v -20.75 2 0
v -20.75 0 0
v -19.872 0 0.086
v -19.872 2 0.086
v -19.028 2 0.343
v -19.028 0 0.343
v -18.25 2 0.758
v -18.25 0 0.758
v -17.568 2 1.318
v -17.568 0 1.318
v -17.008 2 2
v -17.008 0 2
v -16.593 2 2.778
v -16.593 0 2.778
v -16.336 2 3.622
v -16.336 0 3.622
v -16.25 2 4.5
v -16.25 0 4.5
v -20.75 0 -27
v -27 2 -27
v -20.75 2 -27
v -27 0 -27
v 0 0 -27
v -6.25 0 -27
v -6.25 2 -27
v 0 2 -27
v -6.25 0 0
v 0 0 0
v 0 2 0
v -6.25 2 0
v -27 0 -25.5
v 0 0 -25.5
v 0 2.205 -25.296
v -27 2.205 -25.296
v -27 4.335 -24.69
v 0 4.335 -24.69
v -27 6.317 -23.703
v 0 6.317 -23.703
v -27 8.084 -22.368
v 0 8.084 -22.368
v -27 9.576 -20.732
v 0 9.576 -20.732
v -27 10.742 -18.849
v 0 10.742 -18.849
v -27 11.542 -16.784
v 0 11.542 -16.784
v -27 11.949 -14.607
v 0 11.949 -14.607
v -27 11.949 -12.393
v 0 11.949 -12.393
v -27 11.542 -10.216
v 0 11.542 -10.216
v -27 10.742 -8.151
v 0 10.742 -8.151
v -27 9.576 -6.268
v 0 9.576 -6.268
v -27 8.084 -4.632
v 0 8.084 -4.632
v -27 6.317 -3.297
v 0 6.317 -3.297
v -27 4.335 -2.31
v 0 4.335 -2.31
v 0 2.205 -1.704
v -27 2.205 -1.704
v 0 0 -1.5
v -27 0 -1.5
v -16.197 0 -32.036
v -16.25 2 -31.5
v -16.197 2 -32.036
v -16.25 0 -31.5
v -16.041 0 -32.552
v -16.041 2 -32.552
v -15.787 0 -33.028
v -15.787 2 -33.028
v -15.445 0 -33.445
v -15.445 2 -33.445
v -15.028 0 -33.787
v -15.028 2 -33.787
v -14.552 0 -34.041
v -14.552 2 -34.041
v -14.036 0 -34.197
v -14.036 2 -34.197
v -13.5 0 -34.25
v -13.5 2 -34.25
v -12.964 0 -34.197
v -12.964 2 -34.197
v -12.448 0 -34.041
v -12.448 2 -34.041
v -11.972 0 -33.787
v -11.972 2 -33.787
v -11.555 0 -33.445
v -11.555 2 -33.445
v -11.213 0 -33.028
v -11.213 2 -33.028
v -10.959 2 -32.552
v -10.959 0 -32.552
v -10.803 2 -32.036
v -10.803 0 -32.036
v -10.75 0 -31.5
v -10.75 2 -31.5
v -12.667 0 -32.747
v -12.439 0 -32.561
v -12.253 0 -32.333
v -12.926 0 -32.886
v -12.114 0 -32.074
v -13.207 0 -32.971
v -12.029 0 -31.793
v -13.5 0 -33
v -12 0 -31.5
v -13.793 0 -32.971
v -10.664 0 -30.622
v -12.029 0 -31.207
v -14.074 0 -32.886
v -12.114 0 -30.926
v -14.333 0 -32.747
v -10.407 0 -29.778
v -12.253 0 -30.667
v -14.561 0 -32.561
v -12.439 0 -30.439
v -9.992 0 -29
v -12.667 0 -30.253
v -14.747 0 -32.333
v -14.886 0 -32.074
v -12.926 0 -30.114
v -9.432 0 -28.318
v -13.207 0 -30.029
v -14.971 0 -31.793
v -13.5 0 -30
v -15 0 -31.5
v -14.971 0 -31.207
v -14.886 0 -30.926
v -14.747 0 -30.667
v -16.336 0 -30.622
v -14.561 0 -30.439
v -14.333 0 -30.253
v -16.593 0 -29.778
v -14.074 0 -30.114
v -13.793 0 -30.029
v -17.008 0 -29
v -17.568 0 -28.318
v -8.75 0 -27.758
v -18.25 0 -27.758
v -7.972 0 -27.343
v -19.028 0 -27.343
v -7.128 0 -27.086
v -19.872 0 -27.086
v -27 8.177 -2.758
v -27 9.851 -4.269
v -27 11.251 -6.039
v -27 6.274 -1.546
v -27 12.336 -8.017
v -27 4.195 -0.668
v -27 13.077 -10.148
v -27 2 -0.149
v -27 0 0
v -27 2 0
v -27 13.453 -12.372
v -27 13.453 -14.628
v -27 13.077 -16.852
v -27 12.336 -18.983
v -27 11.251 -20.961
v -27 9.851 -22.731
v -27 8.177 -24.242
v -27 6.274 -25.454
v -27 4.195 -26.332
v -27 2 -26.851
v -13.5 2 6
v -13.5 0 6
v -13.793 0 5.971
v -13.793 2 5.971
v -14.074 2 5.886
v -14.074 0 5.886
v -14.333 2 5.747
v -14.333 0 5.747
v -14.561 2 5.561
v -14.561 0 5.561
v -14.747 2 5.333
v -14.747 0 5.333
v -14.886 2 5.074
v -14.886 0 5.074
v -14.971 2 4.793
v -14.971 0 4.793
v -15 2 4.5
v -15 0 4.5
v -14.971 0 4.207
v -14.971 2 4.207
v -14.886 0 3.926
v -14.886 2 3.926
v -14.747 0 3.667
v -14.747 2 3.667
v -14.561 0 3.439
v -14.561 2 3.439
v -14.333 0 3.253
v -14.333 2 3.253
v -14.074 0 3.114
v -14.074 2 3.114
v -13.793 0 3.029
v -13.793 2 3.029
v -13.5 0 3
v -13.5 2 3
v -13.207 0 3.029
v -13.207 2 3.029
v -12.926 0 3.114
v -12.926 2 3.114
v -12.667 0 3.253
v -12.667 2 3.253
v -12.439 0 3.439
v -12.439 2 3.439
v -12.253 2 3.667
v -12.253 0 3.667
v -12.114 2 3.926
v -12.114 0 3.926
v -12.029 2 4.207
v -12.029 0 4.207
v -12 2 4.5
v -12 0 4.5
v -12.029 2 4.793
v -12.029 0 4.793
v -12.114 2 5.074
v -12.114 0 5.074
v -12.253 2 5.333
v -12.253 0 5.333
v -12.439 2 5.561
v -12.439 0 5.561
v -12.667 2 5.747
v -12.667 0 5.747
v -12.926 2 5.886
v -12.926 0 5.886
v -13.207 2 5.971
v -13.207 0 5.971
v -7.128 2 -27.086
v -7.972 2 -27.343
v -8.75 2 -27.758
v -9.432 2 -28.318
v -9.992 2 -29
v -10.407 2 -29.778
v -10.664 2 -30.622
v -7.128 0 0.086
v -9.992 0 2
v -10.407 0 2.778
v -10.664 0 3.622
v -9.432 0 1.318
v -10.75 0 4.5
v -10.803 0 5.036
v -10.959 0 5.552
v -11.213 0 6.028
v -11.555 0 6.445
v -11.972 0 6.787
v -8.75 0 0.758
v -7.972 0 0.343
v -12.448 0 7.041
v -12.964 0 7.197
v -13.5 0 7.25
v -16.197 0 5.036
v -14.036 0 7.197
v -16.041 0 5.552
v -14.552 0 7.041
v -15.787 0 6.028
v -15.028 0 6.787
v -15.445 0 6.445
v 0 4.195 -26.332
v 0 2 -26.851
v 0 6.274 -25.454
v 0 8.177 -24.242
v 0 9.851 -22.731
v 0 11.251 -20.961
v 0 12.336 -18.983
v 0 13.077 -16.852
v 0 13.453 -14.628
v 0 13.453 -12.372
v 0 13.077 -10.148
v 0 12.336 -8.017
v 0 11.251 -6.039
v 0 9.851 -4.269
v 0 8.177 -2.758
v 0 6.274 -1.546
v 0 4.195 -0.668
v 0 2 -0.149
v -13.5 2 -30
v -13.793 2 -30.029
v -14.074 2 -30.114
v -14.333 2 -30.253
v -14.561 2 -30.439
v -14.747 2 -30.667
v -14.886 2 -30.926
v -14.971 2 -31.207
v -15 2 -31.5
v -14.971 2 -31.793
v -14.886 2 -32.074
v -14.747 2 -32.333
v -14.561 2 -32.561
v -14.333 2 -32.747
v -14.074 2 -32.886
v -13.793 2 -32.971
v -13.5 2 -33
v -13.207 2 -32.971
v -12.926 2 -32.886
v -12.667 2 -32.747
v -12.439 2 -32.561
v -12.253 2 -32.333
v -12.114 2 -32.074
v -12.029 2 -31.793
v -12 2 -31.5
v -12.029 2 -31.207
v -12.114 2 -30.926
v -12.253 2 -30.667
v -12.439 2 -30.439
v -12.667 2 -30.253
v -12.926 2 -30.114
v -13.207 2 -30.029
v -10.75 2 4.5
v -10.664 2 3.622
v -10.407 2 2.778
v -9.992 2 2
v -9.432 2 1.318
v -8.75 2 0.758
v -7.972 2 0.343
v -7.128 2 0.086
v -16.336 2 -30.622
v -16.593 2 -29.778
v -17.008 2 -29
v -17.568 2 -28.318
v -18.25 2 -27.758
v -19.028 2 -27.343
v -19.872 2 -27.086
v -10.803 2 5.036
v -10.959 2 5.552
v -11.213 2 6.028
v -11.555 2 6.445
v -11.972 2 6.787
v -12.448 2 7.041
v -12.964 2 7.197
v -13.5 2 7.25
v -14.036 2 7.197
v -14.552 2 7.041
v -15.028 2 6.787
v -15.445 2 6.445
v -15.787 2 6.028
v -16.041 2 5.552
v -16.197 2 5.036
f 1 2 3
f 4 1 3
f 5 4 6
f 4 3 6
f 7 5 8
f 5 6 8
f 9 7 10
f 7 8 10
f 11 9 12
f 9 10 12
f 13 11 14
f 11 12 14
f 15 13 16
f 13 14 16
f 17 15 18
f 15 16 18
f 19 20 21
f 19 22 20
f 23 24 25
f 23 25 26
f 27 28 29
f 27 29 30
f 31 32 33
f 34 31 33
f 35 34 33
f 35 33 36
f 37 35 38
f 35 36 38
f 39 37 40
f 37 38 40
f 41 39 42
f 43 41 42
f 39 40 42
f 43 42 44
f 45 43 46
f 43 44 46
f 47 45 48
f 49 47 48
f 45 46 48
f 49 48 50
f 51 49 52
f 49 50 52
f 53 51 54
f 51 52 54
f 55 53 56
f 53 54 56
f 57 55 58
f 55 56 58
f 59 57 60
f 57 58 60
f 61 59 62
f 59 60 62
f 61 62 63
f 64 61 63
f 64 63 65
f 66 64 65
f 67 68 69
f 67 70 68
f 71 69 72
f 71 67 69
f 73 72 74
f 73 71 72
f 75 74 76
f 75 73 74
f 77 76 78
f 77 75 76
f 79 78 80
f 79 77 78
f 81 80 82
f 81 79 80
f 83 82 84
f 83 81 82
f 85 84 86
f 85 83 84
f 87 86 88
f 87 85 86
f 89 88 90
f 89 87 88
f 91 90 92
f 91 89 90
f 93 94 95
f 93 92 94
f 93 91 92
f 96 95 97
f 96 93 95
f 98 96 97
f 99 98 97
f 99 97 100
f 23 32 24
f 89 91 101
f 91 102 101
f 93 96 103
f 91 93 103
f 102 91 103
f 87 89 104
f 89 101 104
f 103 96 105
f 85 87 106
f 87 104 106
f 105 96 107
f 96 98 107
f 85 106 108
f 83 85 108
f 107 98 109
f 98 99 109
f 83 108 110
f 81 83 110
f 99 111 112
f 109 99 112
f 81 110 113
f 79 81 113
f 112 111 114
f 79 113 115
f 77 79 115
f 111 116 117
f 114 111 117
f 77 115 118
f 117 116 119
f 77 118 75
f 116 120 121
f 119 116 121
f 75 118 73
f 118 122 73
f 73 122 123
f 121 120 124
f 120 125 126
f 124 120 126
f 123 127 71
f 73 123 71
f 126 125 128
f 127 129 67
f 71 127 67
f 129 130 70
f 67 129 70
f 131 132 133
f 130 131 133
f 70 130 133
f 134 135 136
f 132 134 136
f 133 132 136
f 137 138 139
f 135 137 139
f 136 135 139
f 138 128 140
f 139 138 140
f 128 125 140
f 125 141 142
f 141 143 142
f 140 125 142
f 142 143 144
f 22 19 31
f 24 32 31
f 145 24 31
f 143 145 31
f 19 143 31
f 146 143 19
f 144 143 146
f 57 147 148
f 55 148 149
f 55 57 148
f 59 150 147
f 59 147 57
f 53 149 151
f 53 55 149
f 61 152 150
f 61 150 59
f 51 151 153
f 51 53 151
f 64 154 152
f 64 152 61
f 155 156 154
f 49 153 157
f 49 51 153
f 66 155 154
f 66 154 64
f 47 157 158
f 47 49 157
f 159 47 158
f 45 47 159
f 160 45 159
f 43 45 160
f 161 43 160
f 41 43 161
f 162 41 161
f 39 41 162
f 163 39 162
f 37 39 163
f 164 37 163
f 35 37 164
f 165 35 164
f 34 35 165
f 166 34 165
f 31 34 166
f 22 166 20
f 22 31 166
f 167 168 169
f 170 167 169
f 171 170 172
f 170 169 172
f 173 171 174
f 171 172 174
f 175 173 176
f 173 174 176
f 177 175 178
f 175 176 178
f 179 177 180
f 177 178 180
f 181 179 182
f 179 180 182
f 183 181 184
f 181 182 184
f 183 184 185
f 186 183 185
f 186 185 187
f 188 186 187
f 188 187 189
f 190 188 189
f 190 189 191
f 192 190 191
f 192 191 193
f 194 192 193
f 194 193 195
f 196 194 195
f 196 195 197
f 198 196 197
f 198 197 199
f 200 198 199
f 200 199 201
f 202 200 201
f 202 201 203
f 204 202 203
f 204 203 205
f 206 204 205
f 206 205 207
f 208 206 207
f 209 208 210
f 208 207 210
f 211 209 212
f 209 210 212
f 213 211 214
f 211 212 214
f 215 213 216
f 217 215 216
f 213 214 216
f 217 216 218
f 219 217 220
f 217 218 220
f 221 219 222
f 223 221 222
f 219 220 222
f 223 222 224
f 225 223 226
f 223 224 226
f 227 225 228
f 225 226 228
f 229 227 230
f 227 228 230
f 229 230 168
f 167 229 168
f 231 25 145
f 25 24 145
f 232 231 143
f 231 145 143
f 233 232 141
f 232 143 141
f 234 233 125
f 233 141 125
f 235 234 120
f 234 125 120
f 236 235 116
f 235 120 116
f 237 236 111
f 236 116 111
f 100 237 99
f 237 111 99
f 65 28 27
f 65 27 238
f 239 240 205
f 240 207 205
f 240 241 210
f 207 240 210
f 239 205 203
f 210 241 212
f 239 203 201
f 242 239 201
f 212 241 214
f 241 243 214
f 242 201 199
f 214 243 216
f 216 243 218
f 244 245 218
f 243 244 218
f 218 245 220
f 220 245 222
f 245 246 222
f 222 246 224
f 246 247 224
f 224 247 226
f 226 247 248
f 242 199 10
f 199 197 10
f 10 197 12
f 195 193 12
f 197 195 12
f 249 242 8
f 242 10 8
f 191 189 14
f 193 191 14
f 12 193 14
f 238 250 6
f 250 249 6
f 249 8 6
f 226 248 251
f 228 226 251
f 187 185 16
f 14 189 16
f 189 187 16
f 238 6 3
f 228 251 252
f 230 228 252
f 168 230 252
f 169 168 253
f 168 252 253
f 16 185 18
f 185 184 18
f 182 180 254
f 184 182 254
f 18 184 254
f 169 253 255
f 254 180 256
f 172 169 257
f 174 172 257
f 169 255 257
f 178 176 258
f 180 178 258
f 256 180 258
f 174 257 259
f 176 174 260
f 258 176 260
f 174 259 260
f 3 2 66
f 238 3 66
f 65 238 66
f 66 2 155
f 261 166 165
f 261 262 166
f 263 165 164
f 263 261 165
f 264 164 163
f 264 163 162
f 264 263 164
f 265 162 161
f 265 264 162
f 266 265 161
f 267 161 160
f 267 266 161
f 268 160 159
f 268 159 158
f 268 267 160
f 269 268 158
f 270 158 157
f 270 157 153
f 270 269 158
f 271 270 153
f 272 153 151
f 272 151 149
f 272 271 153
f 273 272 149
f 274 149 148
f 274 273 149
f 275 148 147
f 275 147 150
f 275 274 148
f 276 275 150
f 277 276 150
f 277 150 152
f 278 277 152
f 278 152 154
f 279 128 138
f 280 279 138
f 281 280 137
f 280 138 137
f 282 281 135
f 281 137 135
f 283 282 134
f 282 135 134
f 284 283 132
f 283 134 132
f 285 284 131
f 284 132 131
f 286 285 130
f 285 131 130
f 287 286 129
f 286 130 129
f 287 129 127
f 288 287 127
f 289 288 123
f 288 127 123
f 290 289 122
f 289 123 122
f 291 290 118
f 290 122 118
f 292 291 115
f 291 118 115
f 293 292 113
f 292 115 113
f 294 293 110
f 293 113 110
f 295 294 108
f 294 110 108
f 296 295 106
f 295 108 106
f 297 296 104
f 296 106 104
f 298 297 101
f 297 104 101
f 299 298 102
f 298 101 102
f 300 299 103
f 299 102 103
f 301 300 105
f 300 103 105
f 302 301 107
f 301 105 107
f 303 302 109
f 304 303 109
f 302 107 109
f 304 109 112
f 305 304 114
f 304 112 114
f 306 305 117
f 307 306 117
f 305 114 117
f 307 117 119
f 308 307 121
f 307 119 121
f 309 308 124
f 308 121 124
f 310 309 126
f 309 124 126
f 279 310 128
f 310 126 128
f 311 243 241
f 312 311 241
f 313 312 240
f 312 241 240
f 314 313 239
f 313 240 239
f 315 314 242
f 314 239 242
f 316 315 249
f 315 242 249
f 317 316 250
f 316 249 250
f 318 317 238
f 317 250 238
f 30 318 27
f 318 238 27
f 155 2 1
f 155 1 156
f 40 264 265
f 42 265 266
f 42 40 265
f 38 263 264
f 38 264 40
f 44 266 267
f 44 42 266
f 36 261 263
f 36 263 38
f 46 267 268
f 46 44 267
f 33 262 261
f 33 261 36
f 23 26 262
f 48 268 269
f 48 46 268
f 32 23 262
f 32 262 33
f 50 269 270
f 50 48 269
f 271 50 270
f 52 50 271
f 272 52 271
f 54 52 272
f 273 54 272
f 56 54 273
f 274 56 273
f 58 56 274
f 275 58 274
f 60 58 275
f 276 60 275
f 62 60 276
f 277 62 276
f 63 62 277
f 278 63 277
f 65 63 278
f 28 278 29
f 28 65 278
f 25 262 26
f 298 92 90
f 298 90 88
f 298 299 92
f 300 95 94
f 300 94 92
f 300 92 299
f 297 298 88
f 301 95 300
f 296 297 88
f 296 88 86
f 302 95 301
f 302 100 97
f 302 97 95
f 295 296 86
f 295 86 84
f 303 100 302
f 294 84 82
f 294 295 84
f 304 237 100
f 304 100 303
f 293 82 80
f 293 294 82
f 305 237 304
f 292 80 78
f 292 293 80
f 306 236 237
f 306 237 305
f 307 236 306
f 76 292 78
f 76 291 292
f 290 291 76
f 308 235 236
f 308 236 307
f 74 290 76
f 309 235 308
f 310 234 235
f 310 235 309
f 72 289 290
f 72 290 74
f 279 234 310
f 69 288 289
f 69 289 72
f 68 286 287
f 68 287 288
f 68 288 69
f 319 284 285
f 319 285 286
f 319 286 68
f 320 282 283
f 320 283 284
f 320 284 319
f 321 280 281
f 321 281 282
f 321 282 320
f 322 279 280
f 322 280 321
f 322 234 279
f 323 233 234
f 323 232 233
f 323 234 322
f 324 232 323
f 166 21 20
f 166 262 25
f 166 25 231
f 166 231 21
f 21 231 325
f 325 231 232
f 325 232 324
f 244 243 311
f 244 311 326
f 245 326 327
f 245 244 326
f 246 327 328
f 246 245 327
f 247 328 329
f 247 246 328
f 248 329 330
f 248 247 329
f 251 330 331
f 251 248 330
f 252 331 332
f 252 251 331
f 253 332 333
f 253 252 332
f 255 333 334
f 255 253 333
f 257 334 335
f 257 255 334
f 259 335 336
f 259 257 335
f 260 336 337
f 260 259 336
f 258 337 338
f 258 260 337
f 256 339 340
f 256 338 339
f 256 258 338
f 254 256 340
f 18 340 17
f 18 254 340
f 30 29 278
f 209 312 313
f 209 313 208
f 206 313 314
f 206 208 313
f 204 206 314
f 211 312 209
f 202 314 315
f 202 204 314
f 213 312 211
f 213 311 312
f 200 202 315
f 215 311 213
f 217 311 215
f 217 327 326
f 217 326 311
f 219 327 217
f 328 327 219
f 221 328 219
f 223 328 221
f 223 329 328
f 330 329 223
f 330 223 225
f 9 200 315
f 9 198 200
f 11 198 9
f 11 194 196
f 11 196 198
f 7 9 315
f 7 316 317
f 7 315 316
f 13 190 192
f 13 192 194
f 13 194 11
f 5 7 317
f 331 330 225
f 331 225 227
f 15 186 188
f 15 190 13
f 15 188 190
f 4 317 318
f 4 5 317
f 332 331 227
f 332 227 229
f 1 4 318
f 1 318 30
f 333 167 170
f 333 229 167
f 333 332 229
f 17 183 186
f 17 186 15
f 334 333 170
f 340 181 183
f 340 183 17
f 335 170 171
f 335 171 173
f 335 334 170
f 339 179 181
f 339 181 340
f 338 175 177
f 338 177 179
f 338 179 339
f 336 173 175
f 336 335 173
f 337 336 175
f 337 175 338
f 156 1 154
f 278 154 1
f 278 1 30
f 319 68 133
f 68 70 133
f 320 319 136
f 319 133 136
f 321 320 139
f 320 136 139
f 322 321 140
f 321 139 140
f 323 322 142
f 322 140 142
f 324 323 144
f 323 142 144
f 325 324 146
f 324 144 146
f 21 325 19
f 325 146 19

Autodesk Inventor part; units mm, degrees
ref_plane "YZ Plane" through (0, 0, 0) normal (1, 0, 0) x (0, 1, 0)
ref_plane "XZ Plane" through (0, 0, 0) normal (0, 1, 0) x (-1, 0, 0)
ref_plane "XY Plane" through (0, 0, 0) normal (0, 0, 1) x (1, 0, 0)
sketch "スケッチ1" plane through (0, 0, 0) normal (0, 1, 0) x (-1, 0, 0)
  line L0 (0, 0) -> (27, 0)
  line L1 (27, 0) -> (27, -27)
  line L2 (27, -27) -> (0, -27)
  line L3 (0, -27) -> (0, 0)
  circle A0 centre (13.5, 4.5) radius 2.75
  line L4 (16.25, 4.5) -> (20.75, 4.5)
  line L5 (10.75, 4.5) -> (6.25, 4.5)
  arc A1 (16.25, 4.5) -> (20.75, 0) centre (20.75, 4.5) ccw
  arc A2 (6.25, 0) -> (10.75, 4.5) centre (6.25, 4.5) ccw
  circle A3 centre (13.5, -31.5) radius 2.75
  line L6 (10.75, -31.5) -> (6.25, -31.5)
  line L7 (16.25, -31.5) -> (20.75, -31.5)
  arc A4 (20.75, -27) -> (16.25, -31.5) centre (20.75, -31.5) ccw
  arc A5 (10.75, -31.5) -> (6.25, -27) centre (6.25, -31.5) ccw
  dimension "d0" = 27
  dimension "d1" = 27
  dimension "d11" = 5.5
  dimension "d12" = 4.5
  dimension "d13" = 4.5
  dimension "d14" = 4.5
  dimension "d15" = 5.5
  dimension "d16" = 4.5
  dimension "d17" = 4.5
  dimension "d18" = 4.5
extrude "押し出し1" add sketch "スケッチ1" along normal blind 2
sketch "スケッチ2" plane through (0, 0, 0) normal (1, 0, 0) x (0, 0, -1)
  line L0 (27, 0) -> (0, 0) projected
  circle A0 centre (13.5, 0) radius 13.5
  line L1 (27, 2) -> (0, 2)
  line L2 (0.149, 2) -> (26.851, 2)
  dimension "d21" = 27
extrude "押し出し2" add sketch "スケッチ2" against normal blind 27 contours L1 A0
sketch "スケッチ3" plane through (0, 2, 0) normal (0, 1, 0) x (1, 0, 0)
  arc A0 (-10.75, 31.5) -> (-16.25, 31.5) centre (-13.5, 31.5) ccw projected
  arc A1 (-16.25, -4.5) -> (-10.75, -4.5) centre (-13.5, -4.5) ccw projected
  point P0 (0, 0)
hole "穴1" at (-13.5, 2, -31.5) at (-13.5, 2, 4.5) direction (0, -1, 0) diameter 3 end through all
sketch "スケッチ4" plane through (0, 0, 0) normal (1, 0, 0) x (0, 0, -1)
  line L0 (27, 0) -> (0, 0) projected
  circle A0 centre (13.5, 0) radius 12
  point P0 (1.5, 0)
  point P1 (25.5, 0)
  dimension "d31" = 24
extrude "押し出し3" cut sketch "スケッチ4" against normal through all contours L0 A0 picked at (16.494, 4.567)
properties part number "daisen_moto_parts2"
